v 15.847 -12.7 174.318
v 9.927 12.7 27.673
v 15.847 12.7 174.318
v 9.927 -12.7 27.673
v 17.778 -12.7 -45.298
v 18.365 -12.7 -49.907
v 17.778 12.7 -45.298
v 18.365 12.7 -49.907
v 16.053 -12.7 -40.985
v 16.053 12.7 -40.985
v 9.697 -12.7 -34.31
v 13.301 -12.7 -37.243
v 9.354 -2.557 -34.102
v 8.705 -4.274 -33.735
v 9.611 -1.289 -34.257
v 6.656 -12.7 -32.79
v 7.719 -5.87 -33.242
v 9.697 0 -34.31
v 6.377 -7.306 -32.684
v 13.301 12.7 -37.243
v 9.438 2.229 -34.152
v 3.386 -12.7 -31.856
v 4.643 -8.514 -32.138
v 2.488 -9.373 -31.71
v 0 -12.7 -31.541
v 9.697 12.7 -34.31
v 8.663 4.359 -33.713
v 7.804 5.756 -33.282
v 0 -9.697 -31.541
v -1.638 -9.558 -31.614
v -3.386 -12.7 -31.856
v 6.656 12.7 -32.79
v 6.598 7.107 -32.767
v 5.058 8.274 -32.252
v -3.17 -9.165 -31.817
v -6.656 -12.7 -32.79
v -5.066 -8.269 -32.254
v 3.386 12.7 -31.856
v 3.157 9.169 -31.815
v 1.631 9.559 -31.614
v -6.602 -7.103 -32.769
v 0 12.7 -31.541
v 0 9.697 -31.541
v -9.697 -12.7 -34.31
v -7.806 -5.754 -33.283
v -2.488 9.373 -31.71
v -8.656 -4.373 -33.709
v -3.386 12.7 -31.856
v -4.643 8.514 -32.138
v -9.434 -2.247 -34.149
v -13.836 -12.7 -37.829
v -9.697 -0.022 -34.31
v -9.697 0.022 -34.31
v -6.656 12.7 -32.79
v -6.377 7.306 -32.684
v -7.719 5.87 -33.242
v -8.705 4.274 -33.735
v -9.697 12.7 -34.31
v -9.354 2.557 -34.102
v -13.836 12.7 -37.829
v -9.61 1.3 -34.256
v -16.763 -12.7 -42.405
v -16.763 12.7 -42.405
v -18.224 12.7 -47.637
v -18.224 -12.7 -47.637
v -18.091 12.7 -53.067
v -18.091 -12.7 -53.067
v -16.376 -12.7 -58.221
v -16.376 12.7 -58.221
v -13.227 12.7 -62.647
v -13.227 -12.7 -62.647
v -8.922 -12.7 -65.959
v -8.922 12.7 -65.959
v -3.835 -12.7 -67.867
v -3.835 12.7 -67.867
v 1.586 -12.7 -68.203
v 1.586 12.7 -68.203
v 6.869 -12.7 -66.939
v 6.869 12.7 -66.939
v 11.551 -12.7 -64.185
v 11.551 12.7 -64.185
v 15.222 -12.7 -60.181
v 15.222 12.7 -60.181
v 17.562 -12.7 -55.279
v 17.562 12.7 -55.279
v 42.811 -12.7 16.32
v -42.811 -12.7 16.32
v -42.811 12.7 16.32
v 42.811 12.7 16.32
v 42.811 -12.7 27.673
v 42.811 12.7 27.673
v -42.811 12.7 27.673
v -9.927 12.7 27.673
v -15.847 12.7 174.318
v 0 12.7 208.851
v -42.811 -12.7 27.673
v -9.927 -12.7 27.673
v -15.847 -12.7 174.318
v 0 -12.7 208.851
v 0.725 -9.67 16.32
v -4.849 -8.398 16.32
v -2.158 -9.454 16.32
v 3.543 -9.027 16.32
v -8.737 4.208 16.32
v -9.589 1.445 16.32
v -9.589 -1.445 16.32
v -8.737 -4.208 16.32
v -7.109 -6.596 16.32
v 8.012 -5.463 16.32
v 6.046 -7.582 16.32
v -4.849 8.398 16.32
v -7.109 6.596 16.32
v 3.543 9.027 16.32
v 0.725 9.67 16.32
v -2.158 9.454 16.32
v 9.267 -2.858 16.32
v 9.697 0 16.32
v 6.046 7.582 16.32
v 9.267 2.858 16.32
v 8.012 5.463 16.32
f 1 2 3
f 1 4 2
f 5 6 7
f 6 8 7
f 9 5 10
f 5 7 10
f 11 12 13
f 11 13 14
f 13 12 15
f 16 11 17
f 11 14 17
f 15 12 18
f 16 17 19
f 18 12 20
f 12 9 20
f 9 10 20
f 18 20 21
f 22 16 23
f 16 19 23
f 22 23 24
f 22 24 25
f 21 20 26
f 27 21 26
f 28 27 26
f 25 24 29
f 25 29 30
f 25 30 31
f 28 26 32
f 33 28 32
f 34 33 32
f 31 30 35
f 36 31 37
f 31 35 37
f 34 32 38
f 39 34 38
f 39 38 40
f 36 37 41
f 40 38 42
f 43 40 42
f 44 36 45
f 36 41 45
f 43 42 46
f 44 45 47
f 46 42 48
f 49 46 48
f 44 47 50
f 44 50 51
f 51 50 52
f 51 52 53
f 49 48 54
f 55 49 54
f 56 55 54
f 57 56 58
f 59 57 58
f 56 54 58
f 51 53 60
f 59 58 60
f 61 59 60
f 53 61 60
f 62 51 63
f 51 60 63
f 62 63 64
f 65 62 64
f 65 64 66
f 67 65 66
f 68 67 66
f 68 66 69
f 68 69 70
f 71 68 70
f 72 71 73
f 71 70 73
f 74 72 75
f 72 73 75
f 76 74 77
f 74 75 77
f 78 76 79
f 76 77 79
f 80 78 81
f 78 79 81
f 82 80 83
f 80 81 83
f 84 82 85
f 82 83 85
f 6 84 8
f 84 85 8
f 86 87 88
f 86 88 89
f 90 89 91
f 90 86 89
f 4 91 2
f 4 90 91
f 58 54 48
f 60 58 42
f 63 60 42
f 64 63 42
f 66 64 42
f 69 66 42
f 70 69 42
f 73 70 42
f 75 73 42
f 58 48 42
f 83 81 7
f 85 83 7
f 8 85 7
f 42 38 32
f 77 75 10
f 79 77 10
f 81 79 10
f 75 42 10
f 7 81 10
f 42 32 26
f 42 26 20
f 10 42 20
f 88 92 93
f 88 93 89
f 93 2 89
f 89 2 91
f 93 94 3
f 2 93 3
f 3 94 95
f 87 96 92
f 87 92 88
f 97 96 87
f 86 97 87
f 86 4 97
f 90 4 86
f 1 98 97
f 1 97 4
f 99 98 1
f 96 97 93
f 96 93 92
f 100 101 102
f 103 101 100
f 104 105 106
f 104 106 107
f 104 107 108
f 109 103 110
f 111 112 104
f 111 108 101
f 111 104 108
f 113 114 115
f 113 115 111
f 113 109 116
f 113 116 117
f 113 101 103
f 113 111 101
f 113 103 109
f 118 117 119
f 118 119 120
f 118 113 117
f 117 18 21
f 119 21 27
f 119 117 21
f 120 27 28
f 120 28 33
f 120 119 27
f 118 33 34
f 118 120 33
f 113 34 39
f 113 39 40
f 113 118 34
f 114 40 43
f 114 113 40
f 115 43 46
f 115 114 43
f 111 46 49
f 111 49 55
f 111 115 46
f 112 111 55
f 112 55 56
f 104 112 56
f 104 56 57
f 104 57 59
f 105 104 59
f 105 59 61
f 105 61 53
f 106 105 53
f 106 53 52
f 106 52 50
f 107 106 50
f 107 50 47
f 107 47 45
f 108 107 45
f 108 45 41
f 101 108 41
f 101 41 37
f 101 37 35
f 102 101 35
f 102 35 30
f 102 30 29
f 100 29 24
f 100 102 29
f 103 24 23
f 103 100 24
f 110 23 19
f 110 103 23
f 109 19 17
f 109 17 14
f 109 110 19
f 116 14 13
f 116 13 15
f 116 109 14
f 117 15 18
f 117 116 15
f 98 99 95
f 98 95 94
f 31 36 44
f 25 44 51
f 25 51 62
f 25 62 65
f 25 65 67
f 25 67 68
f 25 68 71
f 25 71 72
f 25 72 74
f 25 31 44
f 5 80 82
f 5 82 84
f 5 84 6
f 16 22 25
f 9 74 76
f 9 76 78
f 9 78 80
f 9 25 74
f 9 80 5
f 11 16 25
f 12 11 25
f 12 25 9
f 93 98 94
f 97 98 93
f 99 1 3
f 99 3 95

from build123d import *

# Parameters (mm, degrees)
F0_W     = 9.6974931657
F0_H     = 5.6765731424
F0_W_2   = 9.6974670887
F1_DEPTH = 12.7
F3_DEPTH = 12.7


# Not quite as in the source:
# - ends of sketch curves that miss each other by under 0.0002 mm in the source are joined


with BuildPart() as f1:
    # F0 (on Front) → F1 (new body, symmetric)
    with BuildSketch(Plane.XZ):
        Polygon((-9.9266454939, 27.6733003557), (9.9266454939, 27.6733003557), (15.8470887691, 174.3181347847), (0, 208.8506370783), (-15.8470887691, 174.3181347847), align=None)
        Polygon((9.6974931657, 21.9967272133), (9.6974931657, 16.3201540709), (42.8108498454, 16.3201540709), (42.8108498454, 27.6733003557), (9.9266454939, 27.6733003557), align=None)
        Polygon((-42.8108498454, 16.3201540709), (-9.6974670887, 16.3201540709), (-9.6974670887, 21.9967272133), (-9.9266454939, 27.6733003557), (-42.8108498454, 27.6733003557), align=None)
        Polygon((0, 21.9967272133), (9.6974931657, 21.9967272133), (9.9266454939, 27.6733003557), (-9.9266454939, 27.6733003557), (-9.6974670887, 21.9967272133), align=None)
        with Locations((4.8487465829, 19.1584406421)):
            Rectangle(F0_W, F0_H)
        with Locations((-4.8487335443, 19.1584406421)):
            Rectangle(F0_W_2, F0_H)
    extrude(amount=F1_DEPTH, both=True)


with BuildPart() as f2:
    # F0 (on Front) → F2 (revolve)
    with BuildSketch(Plane.XZ):
        with BuildLine():
            ThreePointArc((0, -31.5412492268), (5.0425448571, -32.2470761559), (9.6974931657, -34.3103033691))
            Line((9.6974931657, -34.3103033691), (9.6974931657, 16.3201540709))
            Line((9.6974931657, 16.3201540709), (0, 16.3201540709))
            Line((0, 16.3201540709), (0, -31.5412492268))
        make_face()
    revolve(axis=Axis((0, 0, -14.901005663), (0, 0, 1)))

    # F0 (on Front) → F3 (join, symmetric)
    with BuildSketch(Plane.XZ):
        with BuildLine():
            ThreePointArc((-9.6974670887, -34.3102871549), (-8.9215307642, -65.9592970493), (18.3653026112, -49.9065518379))
            ThreePointArc((18.3653026112, -49.9065518379), (16.0527526698, -40.9850344938), (9.6974931657, -34.3103033691))
            Line((9.6974931657, -34.3103033691), (9.6974931657, -51.7987385392))
            Line((9.6974931657, -51.7987385392), (0, -51.7987385392))
            Line((0, -51.7987385392), (-9.6974670887, -51.7987385392))
            Line((-9.6974670887, -51.7987385392), (-9.6974670887, -34.3102871549))
        make_face()
        with BuildLine():
            ThreePointArc((0, -31.5412492268), (-5.0425300937, -32.2470719403), (-9.6974670887, -34.3102871549))
            Line((-9.6974670887, -34.3102871549), (-9.6974670887, -51.7987385392))
            Line((-9.6974670887, -51.7987385392), (0, -51.7987385392))
            Line((0, -51.7987385392), (0, -49.9065518379))
            Line((0, -49.9065518379), (0, -31.5412492268))
        make_face()
        with BuildLine():
            Line((9.6974931657, -51.7987385392), (9.6974931657, -34.3103033691))
            ThreePointArc((9.6974931657, -34.3103033691), (5.0425448571, -32.2470761559), (0, -31.5412492268))
            Line((0, -31.5412492268), (0, -49.9065518379))
            Line((0, -49.9065518379), (0, -51.7987385392))
            Line((0, -51.7987385392), (9.6974931657, -51.7987385392))
        make_face()
    extrude(amount=F3_DEPTH, both=True)


solid = Compound([f1.part, f2.part])
